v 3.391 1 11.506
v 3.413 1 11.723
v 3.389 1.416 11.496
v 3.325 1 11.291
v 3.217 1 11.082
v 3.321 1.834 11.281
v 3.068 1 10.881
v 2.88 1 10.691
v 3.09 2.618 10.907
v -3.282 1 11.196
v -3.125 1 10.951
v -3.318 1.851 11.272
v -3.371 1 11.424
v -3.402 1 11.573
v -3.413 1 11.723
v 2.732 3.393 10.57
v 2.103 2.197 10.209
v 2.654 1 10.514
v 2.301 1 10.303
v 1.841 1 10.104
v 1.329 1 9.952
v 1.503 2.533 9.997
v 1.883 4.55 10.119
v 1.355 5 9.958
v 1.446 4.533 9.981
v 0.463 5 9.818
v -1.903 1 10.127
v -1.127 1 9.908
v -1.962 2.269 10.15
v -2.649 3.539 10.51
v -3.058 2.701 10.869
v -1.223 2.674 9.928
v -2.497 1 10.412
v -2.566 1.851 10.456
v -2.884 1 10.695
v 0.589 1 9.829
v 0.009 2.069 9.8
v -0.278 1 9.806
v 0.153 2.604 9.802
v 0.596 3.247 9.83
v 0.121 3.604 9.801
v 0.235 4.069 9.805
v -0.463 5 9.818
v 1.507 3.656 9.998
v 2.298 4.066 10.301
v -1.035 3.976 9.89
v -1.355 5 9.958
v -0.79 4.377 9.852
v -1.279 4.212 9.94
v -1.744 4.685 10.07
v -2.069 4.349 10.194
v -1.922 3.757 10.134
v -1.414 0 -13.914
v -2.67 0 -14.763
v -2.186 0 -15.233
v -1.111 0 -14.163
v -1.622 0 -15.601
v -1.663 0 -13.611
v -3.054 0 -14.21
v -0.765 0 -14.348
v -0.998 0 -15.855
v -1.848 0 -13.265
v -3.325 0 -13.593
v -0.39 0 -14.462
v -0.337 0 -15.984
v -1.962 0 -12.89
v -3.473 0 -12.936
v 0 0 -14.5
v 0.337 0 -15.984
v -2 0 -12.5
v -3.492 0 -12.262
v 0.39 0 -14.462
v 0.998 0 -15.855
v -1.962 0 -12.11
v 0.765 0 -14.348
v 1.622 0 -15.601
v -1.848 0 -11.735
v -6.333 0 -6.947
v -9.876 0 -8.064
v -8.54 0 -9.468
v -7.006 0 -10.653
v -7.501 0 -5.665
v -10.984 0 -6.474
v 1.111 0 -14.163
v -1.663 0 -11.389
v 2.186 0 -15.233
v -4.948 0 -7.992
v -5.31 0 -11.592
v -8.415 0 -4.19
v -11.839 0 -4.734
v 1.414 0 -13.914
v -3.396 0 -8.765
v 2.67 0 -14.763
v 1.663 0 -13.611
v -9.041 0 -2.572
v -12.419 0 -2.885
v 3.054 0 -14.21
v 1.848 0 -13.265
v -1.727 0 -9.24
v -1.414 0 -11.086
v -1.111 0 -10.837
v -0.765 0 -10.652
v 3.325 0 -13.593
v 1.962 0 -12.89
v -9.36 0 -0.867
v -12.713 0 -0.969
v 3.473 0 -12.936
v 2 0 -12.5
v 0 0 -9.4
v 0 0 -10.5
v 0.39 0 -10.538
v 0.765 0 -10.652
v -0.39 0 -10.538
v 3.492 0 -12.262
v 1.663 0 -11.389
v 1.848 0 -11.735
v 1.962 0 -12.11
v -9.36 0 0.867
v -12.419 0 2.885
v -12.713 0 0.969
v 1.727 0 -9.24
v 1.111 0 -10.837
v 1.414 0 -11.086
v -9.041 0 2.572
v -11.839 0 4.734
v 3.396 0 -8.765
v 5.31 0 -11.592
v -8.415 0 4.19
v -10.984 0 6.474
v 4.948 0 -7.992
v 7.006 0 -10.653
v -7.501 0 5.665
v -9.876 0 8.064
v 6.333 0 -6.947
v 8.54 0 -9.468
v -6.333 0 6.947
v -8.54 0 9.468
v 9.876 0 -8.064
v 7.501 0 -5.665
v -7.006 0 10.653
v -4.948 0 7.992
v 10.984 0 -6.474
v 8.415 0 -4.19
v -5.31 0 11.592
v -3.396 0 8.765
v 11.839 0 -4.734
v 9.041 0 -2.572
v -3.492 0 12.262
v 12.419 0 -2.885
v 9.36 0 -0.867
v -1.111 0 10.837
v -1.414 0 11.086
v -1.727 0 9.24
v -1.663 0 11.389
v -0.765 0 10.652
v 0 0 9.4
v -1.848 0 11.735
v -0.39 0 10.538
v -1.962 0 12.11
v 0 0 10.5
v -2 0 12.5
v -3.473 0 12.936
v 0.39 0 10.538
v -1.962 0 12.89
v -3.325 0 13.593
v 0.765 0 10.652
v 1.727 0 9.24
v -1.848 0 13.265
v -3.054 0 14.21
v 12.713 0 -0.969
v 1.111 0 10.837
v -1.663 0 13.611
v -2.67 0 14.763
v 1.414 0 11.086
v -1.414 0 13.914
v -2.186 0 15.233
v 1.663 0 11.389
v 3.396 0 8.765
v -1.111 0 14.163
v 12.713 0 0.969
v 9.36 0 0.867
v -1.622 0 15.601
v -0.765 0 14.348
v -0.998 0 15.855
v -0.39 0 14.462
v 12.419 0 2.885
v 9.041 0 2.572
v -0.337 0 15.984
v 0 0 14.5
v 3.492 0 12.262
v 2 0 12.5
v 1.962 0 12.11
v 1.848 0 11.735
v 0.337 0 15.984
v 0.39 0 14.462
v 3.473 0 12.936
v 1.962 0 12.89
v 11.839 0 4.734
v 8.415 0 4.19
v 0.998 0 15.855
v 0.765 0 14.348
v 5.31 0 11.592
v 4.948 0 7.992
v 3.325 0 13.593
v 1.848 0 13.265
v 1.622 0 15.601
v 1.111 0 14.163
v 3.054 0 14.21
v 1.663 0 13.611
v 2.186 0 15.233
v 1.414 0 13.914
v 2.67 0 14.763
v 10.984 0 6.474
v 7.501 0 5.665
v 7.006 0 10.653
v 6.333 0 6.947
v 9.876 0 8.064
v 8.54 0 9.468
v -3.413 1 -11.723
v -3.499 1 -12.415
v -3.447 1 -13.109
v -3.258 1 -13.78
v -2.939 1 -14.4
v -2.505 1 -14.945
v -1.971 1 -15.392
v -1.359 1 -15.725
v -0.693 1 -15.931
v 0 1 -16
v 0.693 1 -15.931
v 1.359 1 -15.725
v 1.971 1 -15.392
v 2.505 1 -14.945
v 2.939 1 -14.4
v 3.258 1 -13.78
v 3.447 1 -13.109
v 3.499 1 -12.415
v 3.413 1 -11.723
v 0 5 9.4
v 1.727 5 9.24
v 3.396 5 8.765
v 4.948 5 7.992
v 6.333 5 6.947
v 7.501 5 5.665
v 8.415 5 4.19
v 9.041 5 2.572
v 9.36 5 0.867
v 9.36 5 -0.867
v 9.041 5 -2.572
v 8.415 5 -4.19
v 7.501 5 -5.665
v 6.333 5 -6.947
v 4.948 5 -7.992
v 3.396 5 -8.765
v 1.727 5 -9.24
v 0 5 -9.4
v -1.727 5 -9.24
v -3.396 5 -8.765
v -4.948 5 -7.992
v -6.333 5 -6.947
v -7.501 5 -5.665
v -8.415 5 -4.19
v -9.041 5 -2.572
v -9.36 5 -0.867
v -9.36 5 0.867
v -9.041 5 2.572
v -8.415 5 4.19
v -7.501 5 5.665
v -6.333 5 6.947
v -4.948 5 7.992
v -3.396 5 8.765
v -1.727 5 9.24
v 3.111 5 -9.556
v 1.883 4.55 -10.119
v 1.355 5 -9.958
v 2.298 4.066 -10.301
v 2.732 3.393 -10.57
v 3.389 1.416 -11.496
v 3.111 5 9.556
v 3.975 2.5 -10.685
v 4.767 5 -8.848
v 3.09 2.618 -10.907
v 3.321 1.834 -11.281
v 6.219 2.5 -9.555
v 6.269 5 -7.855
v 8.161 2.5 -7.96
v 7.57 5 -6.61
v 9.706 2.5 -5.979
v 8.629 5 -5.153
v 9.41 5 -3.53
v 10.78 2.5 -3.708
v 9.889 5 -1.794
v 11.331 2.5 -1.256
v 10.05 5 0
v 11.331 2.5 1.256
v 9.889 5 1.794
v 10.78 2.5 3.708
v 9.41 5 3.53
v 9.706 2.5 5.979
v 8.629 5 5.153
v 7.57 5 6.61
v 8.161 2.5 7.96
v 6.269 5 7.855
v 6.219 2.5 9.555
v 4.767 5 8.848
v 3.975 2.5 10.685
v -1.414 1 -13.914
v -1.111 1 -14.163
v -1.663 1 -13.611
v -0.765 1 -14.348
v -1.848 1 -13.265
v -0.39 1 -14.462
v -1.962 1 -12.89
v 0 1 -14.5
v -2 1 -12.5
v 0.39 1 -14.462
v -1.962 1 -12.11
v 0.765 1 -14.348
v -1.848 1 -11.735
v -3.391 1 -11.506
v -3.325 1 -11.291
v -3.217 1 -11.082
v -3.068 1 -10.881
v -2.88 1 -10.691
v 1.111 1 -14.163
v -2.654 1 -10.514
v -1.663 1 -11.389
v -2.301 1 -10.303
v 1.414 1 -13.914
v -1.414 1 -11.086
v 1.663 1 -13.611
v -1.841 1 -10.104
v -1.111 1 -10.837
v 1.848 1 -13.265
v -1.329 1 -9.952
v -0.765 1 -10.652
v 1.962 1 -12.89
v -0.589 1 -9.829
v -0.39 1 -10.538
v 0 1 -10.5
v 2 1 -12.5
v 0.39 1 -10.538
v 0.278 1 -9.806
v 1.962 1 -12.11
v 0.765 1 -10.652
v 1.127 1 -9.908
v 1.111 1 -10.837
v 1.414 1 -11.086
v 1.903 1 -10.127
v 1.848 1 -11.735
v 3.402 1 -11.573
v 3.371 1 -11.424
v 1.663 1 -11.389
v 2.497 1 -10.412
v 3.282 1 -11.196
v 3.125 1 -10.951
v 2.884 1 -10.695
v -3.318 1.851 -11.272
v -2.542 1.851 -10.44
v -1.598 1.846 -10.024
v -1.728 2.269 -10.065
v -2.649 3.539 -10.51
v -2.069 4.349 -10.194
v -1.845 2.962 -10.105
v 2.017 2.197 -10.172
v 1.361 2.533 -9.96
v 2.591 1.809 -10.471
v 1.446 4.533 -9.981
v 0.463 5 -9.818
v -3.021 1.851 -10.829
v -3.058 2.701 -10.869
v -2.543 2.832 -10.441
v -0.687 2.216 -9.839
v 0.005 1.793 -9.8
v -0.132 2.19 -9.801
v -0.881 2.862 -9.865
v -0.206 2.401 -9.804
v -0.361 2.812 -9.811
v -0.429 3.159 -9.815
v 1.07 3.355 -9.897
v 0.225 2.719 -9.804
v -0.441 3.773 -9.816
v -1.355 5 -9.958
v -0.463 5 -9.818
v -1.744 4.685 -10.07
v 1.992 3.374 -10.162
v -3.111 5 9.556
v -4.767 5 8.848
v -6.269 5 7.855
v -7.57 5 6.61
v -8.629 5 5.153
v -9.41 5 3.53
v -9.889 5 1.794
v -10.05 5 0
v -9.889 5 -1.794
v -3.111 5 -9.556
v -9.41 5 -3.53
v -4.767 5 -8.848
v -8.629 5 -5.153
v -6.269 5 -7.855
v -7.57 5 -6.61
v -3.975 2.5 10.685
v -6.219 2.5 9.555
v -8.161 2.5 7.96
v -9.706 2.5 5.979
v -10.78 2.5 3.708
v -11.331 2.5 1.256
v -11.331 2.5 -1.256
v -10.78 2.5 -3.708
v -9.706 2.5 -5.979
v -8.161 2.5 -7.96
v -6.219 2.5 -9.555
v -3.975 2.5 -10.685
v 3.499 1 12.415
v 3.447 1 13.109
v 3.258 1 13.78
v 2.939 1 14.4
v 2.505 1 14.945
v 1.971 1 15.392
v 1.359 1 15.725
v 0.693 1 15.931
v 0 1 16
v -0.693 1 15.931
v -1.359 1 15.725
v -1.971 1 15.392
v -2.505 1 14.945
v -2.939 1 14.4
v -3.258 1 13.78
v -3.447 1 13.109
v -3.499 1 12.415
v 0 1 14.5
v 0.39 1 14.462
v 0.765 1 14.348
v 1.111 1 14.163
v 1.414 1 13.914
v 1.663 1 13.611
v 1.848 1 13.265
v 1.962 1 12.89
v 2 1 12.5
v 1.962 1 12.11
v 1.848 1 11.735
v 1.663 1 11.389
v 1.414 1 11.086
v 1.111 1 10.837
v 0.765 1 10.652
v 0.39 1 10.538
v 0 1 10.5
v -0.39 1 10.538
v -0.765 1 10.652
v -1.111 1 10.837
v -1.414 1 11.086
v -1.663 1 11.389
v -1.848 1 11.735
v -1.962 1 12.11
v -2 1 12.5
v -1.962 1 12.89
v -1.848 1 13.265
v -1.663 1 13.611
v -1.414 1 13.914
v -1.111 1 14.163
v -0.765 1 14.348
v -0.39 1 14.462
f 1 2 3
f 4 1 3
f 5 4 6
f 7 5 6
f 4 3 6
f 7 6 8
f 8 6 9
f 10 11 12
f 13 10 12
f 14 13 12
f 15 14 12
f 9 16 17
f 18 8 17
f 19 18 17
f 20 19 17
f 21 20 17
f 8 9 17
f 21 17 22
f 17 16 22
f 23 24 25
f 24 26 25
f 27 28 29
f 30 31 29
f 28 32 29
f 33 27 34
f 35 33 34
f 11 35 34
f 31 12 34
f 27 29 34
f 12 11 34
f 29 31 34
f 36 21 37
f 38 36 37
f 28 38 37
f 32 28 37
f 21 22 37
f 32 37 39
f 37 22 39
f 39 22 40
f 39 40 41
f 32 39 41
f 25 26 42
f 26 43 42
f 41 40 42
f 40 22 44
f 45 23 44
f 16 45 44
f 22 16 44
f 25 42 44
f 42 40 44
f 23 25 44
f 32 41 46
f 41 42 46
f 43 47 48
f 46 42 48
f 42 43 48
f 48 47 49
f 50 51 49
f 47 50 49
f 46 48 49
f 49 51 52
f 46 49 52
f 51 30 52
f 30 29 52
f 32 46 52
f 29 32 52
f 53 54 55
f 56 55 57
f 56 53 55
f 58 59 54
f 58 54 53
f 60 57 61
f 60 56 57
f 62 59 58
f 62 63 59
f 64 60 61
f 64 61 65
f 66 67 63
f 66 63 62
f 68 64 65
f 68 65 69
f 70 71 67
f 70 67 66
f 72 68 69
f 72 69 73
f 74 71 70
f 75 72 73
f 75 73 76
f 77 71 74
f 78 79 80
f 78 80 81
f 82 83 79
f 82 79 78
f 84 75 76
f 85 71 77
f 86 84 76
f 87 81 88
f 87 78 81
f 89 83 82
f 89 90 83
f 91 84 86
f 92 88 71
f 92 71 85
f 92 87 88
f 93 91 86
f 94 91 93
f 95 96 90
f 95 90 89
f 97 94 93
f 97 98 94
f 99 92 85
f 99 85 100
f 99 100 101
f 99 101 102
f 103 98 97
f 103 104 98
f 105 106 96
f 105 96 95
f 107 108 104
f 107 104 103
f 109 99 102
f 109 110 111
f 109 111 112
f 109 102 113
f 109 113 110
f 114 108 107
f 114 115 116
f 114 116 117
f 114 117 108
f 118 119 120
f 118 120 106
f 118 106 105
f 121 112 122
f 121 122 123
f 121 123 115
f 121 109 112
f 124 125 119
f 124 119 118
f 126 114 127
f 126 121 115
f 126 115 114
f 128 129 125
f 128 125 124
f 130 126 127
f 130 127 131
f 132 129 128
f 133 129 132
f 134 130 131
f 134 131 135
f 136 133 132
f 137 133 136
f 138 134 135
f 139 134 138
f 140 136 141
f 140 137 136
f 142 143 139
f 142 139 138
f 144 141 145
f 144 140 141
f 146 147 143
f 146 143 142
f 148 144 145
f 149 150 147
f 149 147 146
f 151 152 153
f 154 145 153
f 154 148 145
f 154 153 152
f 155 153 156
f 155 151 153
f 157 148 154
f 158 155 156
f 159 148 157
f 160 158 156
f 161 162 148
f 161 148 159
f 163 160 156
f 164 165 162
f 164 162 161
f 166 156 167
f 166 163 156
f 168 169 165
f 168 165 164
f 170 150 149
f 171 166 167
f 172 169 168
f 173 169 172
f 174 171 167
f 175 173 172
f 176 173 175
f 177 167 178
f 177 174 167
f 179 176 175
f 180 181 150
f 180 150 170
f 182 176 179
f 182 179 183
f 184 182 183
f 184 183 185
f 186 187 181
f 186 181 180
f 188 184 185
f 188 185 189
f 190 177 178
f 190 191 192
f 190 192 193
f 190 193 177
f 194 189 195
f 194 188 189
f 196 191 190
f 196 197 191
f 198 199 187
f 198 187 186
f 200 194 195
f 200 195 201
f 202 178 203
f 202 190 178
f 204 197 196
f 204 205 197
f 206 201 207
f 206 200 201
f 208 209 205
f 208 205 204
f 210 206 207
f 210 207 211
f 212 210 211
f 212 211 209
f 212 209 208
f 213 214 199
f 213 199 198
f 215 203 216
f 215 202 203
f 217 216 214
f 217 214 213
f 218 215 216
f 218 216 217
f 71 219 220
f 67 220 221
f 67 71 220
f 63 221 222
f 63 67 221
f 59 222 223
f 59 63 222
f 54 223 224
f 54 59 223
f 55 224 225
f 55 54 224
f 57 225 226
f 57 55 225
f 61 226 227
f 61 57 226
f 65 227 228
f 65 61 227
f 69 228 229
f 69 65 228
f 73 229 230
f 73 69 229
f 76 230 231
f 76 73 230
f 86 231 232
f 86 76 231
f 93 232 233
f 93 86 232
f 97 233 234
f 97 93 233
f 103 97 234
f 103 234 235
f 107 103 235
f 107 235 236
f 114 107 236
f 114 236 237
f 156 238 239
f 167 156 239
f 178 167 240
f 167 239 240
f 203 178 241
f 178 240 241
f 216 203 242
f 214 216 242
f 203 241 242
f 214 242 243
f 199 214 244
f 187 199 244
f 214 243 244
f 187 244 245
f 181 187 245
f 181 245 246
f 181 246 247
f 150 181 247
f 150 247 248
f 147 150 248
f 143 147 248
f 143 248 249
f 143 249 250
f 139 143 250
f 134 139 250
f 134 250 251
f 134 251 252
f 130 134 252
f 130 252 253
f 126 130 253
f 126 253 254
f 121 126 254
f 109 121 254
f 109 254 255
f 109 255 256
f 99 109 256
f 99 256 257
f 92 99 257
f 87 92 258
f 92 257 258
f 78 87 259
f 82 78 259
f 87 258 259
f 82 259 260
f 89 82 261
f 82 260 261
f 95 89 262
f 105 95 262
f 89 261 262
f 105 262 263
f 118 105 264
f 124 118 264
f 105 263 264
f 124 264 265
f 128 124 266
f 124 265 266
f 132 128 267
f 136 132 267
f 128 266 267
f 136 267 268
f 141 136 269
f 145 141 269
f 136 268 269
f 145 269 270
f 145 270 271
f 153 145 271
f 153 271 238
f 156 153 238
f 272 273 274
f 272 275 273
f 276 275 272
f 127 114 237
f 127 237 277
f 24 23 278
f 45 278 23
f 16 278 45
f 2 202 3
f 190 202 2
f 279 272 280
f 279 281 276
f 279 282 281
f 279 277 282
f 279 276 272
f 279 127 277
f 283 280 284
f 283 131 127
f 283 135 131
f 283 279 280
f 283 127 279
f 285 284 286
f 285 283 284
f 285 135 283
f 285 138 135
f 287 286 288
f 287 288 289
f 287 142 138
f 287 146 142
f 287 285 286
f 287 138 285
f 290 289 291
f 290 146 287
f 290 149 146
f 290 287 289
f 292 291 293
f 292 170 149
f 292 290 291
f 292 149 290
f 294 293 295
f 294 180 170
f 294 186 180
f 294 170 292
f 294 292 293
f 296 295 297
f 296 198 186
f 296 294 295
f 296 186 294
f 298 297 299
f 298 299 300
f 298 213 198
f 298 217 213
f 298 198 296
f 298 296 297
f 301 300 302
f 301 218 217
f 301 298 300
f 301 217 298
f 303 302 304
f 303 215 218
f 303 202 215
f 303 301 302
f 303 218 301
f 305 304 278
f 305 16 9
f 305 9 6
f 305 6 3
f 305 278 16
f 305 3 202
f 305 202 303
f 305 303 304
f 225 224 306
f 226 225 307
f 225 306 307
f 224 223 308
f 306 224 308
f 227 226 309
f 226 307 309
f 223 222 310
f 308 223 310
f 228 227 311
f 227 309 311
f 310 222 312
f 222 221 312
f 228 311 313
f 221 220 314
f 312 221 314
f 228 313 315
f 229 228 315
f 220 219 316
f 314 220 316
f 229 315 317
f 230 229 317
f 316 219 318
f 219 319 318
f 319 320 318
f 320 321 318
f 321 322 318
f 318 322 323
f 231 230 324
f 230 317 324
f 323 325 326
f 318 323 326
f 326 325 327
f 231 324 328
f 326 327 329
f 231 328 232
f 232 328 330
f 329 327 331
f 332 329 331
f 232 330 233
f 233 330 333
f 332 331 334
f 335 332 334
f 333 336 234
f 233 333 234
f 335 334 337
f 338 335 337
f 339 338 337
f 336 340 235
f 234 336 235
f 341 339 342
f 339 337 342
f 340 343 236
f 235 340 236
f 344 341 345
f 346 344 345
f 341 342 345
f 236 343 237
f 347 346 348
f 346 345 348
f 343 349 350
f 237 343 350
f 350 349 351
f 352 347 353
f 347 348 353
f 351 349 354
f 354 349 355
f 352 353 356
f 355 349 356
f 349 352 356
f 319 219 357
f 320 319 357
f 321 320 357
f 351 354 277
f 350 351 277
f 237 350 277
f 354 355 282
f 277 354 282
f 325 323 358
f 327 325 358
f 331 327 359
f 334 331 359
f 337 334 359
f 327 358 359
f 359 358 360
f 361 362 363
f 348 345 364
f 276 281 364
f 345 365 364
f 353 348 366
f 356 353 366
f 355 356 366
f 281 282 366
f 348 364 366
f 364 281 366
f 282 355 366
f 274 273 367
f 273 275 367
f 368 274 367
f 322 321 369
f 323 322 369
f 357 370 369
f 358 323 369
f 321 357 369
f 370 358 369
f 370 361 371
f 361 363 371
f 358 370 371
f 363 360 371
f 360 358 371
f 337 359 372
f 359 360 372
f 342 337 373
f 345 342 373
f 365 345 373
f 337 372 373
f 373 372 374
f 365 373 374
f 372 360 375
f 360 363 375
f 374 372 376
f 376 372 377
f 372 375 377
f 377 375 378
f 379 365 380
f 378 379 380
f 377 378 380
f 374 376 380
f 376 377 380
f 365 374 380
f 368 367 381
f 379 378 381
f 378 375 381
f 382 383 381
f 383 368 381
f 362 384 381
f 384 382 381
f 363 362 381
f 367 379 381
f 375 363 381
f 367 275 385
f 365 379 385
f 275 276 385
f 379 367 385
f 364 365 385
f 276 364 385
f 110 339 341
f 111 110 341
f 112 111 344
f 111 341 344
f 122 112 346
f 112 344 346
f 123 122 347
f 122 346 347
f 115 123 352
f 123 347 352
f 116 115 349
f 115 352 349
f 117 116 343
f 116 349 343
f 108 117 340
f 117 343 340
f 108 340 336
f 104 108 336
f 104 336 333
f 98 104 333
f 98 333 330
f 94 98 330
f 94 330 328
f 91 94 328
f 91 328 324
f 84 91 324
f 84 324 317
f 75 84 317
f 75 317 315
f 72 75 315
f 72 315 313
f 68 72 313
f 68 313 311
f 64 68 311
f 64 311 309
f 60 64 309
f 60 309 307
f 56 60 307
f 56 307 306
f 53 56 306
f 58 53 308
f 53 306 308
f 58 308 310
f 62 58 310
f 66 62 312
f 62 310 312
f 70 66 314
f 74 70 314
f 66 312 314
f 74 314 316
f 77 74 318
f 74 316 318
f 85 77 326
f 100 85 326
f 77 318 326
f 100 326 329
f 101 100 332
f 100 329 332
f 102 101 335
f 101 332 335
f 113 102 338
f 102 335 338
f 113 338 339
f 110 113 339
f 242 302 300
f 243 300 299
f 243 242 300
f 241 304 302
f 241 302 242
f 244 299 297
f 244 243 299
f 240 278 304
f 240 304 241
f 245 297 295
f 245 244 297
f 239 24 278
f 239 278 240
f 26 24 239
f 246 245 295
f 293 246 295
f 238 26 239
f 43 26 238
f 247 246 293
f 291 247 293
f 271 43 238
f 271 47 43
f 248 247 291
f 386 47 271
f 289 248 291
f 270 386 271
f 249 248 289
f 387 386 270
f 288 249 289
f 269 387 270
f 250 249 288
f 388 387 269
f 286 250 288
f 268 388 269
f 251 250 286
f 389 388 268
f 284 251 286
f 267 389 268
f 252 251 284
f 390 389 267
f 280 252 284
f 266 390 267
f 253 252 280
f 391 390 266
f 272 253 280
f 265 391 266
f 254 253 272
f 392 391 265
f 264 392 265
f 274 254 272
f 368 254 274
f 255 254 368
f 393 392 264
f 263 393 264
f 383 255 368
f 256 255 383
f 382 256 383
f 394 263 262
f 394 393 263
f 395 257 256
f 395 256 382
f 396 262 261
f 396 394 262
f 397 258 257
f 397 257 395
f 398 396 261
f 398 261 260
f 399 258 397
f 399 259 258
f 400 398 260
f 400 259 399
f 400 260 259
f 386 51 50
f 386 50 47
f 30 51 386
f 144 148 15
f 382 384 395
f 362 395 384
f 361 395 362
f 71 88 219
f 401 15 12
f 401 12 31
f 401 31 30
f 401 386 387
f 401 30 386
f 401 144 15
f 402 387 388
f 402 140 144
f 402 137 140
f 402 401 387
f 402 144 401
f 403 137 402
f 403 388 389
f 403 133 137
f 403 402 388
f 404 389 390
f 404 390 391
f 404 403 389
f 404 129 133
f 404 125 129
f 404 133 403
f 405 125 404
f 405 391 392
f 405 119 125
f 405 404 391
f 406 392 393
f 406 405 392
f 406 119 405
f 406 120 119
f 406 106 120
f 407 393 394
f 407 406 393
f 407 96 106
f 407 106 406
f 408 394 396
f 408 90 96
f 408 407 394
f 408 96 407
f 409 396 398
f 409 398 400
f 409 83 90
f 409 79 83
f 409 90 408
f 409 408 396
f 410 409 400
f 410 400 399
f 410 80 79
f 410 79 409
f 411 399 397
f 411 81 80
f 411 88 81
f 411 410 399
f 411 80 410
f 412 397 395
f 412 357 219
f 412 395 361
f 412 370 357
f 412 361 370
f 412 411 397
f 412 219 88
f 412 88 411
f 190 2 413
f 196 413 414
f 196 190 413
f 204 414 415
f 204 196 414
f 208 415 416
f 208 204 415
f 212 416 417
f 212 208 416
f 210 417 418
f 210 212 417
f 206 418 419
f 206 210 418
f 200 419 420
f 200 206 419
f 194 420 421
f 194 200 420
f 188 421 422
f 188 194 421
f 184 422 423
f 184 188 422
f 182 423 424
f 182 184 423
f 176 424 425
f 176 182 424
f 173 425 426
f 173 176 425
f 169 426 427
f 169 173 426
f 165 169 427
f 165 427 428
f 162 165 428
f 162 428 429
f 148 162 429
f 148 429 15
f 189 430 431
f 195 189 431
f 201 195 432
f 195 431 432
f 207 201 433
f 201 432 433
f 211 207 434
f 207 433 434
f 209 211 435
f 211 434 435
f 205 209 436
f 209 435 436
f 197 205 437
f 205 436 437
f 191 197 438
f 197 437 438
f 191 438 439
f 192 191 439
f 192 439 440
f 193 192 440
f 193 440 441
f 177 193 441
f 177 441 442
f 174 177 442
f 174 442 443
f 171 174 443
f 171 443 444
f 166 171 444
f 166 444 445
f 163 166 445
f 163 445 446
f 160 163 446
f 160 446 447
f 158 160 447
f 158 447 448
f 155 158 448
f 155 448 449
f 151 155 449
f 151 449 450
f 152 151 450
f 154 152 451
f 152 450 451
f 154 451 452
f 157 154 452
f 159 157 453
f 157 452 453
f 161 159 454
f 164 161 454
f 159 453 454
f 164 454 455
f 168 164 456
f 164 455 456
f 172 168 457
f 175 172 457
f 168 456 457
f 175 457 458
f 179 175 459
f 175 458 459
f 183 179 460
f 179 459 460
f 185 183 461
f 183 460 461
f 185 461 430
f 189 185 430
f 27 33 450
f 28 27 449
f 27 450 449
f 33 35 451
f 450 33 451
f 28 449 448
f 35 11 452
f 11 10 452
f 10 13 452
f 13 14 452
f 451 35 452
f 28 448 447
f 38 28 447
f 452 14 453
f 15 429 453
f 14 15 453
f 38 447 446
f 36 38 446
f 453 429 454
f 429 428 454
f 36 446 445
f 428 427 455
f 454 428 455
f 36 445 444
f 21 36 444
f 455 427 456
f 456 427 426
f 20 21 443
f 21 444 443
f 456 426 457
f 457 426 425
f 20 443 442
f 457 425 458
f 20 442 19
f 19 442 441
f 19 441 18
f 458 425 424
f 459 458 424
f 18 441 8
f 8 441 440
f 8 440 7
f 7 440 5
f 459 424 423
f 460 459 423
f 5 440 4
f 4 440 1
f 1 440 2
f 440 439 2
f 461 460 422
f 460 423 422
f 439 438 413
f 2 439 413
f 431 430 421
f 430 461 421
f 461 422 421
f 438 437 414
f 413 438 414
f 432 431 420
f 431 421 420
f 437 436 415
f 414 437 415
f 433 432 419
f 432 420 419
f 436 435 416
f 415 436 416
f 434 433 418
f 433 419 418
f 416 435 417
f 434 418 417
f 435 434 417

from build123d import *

# Parameters (mm, degrees)
BOSS_EXTRU_1_DEPTH      = 5
ESQUISSE12_R            = 3.5
BOSS_EXTRU_2_DEPTH      = 1
ESQUISSE10_RX           = 3.412746185
ESQUISSE10_RY           = 1.923364
ENL_V_MAT_EXTRU_5_DEPTH = 4
ESQUISSE13_R            = 2
ENL_V_MAT_EXTRU_7_DEPTH = 21.846162874
ESQUISSE11_R            = 9.4
ENL_V_MAT_EXTRU_6_DEPTH = 22.060923692


with BuildPart() as part:
    # Esquisse1 → Boss.-Extru.1 (new body)
    with BuildSketch(Plane(origin=(0, 0, 0), x_dir=(1, 0, 0), z_dir=(0, 1, 0))):
        with BuildLine():
            ThreePointArc((-4.625, -8.010734985), (0, -9.25), (4.625, -8.010734985))
            ThreePointArc((4.625, -8.010734985), (9.25, 0), (4.625, 8.010734985))
            ThreePointArc((4.625, 8.010734985), (0, 9.25), (-4.625, 8.010734985))
            ThreePointArc((-4.625, 8.010734985), (-9.25, 0), (-4.625, -8.010734985))
        make_face()
    extrude(amount=BOSS_EXTRU_1_DEPTH)

    # Esquisse8 → Révolution1 (revolve)
    with BuildSketch(Plane.XY, mode=Mode.PRIVATE) as r_volution1_sk:
        Polygon((12.75, 0), (9.25, 0), (9.25, 5), (10.05, 5), align=None)
    revolve(r_volution1_sk.sketch.rotate(Axis((0, 6.978175321, 0), (0, -1, 0)), 90), axis=Axis((0, 6.978175321, 0), (0, -1, 0)))

    # Esquisse12 → Boss.-Extru.2 (add)
    with BuildSketch(Plane.XZ):
        with Locations((0, 12.5)):
            Circle(ESQUISSE12_R)
        with Locations((0, -12.5)):
            Circle(ESQUISSE12_R)
    extrude(amount=-BOSS_EXTRU_2_DEPTH)

    # Esquisse10 → Enlèv. mat.-Extru.5 (cut)
    with BuildSketch(Plane(origin=(0, 5, 0), x_dir=(1, 0, 0), z_dir=(0, 1, 0))):
        with Locations((0, 11.723364)):
            Ellipse(ESQUISSE10_RX, ESQUISSE10_RY)
        with Locations((0, -11.723364)):
            Ellipse(ESQUISSE10_RX, ESQUISSE10_RY)
    extrude(amount=-ENL_V_MAT_EXTRU_5_DEPTH, mode=Mode.SUBTRACT)

    # Esquisse13 → Enlèv. mat.-Extru.7 (cut, through all)
    with BuildSketch(Plane(origin=(0, 1, 0), x_dir=(1, 0, 0), z_dir=(0, 1, 0))):
        with Locations(Location((0, 12.5, 0), (0, 0, 270))):
            Circle(ESQUISSE13_R)
        with Locations(Location((0, -12.5, 0), (0, 0, 270))):
            Circle(ESQUISSE13_R)
    extrude(amount=-ENL_V_MAT_EXTRU_7_DEPTH, mode=Mode.SUBTRACT)

    # Esquisse11 → Enlèv. mat.-Extru.6 (cut, through all)
    with BuildSketch(Plane(origin=(0, 5, 0), x_dir=(1, 0, 0), z_dir=(0, 1, 0))):
        with Locations(Location((0, 0, 0), (0, 0, 270))):
            Circle(ESQUISSE11_R)
    extrude(amount=-ENL_V_MAT_EXTRU_6_DEPTH, mode=Mode.SUBTRACT)


solid = part.part
